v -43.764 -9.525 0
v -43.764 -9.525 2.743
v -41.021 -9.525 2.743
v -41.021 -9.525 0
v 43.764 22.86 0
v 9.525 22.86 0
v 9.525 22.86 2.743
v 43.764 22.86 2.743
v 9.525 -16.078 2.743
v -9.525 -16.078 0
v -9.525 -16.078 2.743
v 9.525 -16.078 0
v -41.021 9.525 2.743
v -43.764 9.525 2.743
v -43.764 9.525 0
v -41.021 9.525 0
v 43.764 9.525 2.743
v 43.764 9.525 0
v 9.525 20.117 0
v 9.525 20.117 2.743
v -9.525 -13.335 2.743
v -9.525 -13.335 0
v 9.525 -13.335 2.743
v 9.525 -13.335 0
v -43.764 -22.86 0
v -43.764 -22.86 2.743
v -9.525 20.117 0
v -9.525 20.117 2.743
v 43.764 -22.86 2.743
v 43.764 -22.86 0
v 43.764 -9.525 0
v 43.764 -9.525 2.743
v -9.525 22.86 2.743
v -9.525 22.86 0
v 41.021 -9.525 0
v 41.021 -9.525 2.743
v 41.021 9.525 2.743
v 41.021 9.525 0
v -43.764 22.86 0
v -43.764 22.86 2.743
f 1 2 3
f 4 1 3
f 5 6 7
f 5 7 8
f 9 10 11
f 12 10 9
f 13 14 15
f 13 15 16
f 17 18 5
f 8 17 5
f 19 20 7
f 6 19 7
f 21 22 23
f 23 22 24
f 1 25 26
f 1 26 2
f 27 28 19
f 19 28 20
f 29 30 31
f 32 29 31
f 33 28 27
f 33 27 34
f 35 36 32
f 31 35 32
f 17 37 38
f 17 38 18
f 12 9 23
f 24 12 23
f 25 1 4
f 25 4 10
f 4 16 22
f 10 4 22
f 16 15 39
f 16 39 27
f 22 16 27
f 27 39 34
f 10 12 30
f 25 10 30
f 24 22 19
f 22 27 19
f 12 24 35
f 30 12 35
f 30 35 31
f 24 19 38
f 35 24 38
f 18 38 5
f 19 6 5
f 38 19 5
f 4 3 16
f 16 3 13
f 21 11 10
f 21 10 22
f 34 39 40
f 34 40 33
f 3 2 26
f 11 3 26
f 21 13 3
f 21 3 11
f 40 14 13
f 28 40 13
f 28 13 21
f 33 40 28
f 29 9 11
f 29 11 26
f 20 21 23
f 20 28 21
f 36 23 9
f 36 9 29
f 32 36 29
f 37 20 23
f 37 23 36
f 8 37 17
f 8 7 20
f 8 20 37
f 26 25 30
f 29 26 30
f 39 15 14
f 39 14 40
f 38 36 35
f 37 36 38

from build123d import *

# Parameters (mm, degrees)
SKETCH1_W           = 87.5284
SKETCH1_H           = 45.72
SKETCH1_W_2         = 19.05
SKETCH1_H_2         = 2.7432
BOSS_EXTRUDE1_DEPTH = 2.7432
SKETCH2_W           = 2.7432
SKETCH2_H           = 19.05
SKETCH2_W_2         = 19.05
SKETCH2_H_2         = 2.7432
CUT_EXTRUDE1_DEPTH  = 3.7432


with BuildPart() as part:
    # Sketch1 → Boss-Extrude1 (new body)
    with BuildSketch(Plane.XY):
        Rectangle(SKETCH1_W, SKETCH1_H)
        with Locations((0, -14.7066)):
            Rectangle(SKETCH1_W_2, SKETCH1_H_2, mode=Mode.SUBTRACT)
    extrude(amount=BOSS_EXTRUDE1_DEPTH)

    # Sketch2 → Cut-Extrude1 (cut, through all)
    with BuildSketch(Plane.XY.offset(2.7432)):
        with Locations((-42.3926, 0)):
            Rectangle(SKETCH2_W, SKETCH2_H)
        with Locations((42.3926, 0)):
            Rectangle(SKETCH2_W, SKETCH2_H)
        with Locations((0, 21.4884)):
            Rectangle(SKETCH2_W_2, SKETCH2_H_2)
    extrude(amount=-CUT_EXTRUDE1_DEPTH, mode=Mode.SUBTRACT)


solid = part.part
